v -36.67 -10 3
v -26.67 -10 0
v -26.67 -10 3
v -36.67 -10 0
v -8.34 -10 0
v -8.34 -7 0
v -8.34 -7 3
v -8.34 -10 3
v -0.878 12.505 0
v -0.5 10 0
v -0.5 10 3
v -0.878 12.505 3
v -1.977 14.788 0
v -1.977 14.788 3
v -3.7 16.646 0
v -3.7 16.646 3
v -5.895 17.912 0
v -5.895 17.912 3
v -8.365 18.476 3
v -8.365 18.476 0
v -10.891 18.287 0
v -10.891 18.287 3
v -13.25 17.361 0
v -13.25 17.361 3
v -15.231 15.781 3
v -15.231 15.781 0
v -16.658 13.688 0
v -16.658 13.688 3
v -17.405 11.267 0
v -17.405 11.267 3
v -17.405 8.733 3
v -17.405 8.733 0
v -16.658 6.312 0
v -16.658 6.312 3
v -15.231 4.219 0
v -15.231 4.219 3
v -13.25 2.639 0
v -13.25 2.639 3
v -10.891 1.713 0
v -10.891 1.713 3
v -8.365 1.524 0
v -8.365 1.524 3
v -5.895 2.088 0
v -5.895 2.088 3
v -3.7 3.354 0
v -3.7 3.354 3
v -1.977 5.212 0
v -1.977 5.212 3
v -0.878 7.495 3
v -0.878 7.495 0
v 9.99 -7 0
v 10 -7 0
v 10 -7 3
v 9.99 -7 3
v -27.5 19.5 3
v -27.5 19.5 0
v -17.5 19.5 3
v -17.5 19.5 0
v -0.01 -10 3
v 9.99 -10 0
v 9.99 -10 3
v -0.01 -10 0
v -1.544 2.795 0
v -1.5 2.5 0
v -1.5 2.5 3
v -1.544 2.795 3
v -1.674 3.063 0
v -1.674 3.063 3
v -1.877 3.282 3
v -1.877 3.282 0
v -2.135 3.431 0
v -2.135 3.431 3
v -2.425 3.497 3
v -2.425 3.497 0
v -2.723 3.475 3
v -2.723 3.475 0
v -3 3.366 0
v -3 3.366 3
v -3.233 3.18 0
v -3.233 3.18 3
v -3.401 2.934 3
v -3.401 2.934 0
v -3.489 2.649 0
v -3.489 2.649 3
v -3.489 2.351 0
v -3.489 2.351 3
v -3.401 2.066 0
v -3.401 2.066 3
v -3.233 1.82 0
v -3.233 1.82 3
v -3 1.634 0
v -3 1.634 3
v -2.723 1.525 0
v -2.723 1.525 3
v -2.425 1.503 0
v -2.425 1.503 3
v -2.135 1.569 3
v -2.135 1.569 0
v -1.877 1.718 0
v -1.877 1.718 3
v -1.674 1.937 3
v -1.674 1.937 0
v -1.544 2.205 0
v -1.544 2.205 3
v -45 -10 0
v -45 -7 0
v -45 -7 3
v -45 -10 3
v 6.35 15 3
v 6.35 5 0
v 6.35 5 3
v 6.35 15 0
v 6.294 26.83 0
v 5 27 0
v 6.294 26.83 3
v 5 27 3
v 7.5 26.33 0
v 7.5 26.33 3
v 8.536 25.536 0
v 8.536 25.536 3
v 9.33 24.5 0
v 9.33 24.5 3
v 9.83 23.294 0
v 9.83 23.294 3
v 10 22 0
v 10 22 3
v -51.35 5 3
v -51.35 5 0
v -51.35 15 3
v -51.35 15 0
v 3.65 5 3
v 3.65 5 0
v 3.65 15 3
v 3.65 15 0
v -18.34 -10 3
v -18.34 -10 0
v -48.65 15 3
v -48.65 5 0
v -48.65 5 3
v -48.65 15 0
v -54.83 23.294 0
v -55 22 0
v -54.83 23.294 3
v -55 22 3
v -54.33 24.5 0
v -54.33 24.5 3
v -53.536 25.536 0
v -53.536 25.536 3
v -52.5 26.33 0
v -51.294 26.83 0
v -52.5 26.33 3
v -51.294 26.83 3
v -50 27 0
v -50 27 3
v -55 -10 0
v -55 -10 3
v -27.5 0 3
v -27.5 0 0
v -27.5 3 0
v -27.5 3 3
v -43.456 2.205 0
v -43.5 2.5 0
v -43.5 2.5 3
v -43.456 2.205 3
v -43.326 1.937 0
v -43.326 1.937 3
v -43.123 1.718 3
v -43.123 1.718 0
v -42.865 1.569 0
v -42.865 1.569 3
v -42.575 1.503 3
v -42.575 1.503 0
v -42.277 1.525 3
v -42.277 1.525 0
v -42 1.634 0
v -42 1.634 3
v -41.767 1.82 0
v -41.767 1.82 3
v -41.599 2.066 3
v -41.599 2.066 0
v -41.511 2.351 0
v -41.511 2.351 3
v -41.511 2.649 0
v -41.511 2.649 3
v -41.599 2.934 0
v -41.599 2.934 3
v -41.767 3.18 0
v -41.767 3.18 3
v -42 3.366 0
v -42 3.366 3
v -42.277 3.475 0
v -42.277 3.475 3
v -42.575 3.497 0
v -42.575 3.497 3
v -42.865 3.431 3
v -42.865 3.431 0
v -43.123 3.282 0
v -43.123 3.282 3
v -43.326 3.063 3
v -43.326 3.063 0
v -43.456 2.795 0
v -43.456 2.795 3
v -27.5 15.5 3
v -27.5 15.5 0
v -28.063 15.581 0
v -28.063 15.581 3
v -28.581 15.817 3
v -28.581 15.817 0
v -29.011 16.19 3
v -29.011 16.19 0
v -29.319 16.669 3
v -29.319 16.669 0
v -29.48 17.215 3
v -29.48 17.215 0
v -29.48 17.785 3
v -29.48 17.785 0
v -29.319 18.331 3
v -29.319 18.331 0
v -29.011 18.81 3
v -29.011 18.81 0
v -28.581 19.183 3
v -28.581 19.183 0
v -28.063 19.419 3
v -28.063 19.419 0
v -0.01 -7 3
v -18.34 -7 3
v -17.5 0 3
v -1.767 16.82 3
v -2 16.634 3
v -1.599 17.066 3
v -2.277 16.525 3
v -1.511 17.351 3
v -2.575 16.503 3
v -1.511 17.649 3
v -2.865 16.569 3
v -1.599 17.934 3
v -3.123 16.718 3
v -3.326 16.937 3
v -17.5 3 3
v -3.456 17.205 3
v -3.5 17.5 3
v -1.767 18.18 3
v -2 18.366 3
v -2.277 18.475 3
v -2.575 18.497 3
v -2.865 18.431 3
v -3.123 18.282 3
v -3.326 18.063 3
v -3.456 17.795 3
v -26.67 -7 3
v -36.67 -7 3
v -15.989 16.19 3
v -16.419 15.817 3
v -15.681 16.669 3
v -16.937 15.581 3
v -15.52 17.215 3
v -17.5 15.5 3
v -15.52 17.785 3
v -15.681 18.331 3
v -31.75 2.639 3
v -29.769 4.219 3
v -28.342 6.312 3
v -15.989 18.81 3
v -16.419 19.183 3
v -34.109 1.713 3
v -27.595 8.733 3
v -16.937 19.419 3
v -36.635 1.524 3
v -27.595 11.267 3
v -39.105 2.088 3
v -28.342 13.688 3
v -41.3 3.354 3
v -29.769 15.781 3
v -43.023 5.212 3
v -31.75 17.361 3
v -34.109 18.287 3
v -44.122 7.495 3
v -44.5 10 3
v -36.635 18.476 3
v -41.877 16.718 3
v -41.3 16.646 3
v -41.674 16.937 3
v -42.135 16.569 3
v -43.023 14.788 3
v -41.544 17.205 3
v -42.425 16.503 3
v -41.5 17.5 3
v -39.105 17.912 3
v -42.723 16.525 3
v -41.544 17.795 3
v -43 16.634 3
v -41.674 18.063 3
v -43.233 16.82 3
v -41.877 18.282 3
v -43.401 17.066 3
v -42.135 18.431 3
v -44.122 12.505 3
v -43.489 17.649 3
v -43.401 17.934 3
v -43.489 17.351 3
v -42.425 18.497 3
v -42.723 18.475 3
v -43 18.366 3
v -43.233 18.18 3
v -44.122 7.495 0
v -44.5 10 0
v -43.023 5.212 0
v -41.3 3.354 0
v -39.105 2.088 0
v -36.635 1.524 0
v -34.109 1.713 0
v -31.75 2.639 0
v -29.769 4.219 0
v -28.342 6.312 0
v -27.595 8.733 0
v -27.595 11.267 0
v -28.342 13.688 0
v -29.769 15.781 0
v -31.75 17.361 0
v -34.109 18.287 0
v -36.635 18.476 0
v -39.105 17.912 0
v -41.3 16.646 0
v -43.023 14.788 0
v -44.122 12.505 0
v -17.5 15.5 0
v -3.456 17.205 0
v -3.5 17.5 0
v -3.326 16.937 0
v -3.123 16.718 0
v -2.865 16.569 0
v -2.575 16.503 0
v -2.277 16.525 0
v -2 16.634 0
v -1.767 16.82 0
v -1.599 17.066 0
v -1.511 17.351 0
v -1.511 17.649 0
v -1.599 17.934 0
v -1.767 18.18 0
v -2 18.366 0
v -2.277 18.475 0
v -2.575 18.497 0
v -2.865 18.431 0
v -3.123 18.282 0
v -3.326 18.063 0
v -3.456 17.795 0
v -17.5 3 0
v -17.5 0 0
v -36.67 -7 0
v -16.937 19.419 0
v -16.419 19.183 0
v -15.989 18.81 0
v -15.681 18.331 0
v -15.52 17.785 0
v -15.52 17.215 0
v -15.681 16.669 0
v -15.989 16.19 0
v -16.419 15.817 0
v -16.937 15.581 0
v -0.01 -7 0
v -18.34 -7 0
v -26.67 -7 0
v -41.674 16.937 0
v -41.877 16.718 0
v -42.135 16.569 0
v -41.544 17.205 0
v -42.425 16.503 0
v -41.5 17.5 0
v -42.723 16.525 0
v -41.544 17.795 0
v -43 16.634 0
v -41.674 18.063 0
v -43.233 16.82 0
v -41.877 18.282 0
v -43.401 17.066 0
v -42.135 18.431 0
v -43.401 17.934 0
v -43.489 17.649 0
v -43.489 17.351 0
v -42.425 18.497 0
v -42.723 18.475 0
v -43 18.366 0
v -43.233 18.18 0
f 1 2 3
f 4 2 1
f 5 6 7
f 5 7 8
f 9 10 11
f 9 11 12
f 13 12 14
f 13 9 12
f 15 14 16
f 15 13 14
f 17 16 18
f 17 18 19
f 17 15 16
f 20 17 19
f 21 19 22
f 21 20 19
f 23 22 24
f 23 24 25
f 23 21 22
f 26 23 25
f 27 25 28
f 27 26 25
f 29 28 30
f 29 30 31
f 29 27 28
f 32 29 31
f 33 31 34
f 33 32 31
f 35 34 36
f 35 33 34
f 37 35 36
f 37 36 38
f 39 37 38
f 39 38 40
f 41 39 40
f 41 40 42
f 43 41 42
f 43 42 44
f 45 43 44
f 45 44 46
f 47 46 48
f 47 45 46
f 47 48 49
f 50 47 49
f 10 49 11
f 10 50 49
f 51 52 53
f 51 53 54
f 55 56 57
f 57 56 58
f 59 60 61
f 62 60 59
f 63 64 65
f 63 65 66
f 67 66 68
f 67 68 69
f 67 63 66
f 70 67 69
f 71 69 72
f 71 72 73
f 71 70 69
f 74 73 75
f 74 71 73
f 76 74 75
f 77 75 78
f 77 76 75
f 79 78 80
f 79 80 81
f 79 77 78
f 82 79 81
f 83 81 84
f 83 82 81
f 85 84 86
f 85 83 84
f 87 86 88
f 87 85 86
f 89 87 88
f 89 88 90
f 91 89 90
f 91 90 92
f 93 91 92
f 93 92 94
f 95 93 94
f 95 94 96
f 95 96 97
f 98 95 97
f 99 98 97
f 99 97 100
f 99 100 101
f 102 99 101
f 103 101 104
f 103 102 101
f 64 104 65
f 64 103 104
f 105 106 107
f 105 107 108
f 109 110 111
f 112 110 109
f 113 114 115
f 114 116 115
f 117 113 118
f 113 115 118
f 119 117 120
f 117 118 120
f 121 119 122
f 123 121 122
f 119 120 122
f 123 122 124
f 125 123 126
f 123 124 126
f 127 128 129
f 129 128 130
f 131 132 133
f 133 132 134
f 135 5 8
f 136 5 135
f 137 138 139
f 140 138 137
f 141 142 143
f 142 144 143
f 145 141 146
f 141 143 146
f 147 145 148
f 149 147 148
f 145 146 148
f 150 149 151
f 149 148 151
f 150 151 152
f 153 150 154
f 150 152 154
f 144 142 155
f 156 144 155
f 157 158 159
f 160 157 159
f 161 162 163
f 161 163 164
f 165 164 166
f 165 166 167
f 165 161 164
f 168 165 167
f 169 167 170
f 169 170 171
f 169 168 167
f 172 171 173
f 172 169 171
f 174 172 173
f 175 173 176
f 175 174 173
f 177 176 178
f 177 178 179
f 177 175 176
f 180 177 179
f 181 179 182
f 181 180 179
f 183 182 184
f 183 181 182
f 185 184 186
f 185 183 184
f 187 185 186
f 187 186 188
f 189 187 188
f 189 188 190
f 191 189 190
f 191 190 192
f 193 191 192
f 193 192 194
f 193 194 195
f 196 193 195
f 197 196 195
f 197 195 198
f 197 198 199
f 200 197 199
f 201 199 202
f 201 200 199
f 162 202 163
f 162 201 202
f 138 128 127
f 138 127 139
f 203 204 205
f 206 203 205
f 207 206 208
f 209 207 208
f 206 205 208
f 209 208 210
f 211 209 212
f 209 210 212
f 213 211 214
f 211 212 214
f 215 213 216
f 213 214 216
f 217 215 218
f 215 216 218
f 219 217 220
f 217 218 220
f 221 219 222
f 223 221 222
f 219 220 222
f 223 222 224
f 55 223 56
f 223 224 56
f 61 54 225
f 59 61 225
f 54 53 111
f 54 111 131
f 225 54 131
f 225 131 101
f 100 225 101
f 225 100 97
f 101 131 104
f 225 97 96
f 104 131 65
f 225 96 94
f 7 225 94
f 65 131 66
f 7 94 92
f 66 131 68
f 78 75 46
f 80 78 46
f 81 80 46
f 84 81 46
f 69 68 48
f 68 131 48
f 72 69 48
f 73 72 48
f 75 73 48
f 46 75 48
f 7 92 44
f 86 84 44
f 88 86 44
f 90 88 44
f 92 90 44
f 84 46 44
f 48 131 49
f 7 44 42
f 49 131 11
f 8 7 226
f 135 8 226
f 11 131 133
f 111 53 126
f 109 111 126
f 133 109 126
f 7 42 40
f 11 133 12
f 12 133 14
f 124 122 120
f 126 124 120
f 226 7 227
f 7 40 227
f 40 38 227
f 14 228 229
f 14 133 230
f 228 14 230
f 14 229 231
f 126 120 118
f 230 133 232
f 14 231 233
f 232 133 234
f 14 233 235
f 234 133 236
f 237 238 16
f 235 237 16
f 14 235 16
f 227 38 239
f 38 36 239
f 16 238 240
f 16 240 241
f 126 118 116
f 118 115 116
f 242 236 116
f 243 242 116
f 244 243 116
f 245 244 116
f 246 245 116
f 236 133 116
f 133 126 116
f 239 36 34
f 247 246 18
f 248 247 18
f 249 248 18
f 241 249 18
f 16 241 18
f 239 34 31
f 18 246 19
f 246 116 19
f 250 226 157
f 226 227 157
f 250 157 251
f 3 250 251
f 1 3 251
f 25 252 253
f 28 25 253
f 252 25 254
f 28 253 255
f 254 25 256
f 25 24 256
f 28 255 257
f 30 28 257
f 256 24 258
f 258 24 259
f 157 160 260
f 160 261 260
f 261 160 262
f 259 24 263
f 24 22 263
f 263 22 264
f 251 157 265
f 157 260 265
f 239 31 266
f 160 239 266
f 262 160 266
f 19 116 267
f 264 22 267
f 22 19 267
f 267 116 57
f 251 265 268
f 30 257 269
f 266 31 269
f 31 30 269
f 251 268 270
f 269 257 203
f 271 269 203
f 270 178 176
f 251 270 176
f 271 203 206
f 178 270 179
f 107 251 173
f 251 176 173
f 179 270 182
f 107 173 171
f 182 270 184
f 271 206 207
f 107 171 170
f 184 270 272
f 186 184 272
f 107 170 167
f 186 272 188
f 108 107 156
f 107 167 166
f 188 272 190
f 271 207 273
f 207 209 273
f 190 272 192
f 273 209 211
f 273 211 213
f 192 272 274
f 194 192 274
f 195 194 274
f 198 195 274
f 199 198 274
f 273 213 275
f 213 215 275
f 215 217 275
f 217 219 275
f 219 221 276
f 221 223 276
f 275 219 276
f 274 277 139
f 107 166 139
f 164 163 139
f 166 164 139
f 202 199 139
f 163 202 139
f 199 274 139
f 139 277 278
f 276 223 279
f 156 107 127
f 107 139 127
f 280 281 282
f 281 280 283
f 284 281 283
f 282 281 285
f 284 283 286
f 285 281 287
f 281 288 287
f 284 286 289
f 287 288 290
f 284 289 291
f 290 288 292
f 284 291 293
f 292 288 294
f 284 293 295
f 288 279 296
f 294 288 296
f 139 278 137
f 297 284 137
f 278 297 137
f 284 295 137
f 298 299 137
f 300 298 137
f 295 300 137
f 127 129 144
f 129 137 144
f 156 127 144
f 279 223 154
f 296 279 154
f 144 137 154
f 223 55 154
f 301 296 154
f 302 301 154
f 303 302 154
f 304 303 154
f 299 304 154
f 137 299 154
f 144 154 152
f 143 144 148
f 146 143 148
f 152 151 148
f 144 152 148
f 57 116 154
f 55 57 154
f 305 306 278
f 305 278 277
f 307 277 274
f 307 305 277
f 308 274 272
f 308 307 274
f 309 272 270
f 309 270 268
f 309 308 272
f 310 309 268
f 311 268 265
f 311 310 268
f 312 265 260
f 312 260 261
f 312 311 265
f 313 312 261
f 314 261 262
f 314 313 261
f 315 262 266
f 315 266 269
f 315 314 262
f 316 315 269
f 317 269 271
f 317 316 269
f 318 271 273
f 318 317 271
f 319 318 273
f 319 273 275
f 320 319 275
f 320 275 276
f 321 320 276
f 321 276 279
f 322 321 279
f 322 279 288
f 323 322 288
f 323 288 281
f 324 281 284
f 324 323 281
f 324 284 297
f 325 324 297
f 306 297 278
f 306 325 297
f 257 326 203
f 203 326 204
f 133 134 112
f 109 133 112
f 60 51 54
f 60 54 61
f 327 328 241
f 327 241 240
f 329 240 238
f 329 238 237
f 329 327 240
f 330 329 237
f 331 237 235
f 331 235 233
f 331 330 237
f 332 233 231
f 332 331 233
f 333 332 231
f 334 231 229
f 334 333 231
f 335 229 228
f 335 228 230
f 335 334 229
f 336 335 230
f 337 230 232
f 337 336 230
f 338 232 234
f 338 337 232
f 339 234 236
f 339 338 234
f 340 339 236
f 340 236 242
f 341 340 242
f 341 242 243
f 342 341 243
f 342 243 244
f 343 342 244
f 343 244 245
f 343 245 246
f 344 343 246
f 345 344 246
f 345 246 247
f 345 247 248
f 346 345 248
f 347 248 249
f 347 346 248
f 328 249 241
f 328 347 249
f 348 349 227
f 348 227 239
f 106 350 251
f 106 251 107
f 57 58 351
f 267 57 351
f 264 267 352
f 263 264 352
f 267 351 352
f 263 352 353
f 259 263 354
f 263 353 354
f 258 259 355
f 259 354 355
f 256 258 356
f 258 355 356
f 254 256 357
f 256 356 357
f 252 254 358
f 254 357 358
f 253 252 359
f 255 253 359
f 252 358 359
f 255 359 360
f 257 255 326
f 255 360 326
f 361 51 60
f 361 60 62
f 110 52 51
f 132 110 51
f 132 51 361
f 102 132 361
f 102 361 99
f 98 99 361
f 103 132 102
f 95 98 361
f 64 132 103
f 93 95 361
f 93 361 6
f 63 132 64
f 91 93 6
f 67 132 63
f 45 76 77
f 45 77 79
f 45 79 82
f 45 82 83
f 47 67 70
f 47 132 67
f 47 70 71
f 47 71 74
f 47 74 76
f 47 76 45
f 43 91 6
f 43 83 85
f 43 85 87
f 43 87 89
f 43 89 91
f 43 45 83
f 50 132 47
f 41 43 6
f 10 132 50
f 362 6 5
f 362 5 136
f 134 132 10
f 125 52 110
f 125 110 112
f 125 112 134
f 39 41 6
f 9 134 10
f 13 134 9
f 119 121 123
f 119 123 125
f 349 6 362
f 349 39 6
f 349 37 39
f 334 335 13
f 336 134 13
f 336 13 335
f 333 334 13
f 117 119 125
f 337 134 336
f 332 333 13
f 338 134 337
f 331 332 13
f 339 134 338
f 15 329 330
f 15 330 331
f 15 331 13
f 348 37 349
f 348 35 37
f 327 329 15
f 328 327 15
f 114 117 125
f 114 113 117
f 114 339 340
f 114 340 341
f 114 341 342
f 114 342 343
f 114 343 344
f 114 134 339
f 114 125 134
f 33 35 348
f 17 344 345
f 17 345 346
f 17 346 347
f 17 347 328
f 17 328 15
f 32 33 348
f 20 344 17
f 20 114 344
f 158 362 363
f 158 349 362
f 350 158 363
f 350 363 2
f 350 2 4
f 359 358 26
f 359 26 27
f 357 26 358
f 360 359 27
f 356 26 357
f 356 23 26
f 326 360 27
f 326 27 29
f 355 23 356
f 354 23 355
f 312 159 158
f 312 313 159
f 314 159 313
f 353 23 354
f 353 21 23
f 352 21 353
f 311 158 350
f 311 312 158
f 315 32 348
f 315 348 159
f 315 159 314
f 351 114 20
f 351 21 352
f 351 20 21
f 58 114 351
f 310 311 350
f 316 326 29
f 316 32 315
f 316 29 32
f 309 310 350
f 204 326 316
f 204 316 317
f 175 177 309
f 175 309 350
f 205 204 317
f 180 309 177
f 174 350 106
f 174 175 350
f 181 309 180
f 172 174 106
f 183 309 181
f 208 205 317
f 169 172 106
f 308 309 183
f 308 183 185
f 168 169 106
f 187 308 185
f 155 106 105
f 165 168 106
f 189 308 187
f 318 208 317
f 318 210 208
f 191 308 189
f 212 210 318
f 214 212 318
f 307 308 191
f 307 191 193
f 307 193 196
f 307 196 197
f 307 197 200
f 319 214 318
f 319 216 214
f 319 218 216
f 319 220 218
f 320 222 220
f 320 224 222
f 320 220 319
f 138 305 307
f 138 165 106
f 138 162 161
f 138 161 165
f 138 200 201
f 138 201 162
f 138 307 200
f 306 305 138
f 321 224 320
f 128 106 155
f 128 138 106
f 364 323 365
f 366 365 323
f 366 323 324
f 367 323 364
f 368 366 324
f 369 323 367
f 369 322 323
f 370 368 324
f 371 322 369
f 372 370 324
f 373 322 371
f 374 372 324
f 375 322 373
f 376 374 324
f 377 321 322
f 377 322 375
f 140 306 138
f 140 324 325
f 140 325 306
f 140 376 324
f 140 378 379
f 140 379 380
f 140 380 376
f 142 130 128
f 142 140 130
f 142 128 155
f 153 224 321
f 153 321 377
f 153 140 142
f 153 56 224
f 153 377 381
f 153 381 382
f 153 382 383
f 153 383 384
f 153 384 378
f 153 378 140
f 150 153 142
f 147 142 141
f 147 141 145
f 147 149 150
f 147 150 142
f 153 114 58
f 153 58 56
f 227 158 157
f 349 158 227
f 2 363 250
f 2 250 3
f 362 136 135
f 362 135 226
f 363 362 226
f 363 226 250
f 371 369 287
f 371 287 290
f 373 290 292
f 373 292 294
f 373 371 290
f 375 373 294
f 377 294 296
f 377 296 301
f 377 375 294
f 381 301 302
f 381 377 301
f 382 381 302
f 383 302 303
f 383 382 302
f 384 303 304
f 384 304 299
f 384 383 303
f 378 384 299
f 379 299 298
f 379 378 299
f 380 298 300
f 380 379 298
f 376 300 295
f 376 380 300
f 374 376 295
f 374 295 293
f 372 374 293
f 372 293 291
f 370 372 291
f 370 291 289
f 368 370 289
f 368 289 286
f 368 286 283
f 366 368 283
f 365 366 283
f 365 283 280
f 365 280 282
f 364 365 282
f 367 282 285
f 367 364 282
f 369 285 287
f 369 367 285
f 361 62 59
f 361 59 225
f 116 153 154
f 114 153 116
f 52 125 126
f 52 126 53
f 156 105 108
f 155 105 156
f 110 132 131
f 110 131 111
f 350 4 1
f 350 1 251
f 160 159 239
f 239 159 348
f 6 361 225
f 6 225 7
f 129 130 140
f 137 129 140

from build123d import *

# Parameters (mm, degrees)
SKETCH1_R           = 1
SKETCH1_R_2         = 8.5
SKETCH1_W           = 10
SKETCH1_H           = 3
SKETCH1_W_2         = 2.7
SKETCH1_H_2         = 10
BOSS_EXTRUDE1_DEPTH = 3
FILLET1_R           = 5


with BuildPart() as part:
    # Sketch1 → Boss-Extrude1 (new body)
    with BuildSketch(Plane.XY):
        Polygon((-18.34, -7), (-26.67, -7), (-26.67, -10), (-36.67, -10), (-36.67, -7), (-45, -7), (-45, -10), (-55, -10), (-55, -7), (-55, 27), (10, 27), (10, -7), (9.99, -7), (9.99, -10), (-0.01, -10), (-0.01, -7), (-8.34, -7), (-8.34, -10), (-18.34, -10), align=None)
        with Locations((-42.5, 17.5)):
            Circle(SKETCH1_R, mode=Mode.SUBTRACT)
        with Locations((-9, 10)):
            Circle(SKETCH1_R_2, mode=Mode.SUBTRACT)
        with Locations(Location((-36, 10, 0), (0, 0, 180))):
            Circle(SKETCH1_R_2, mode=Mode.SUBTRACT)
        with Locations(Location((-2.5, 17.5, 0), (0, 0, 180))):
            Circle(SKETCH1_R, mode=Mode.SUBTRACT)
        with Locations((-2.5, 2.5)):
            Circle(SKETCH1_R, mode=Mode.SUBTRACT)
        with Locations(Location((-42.5, 2.5, 0), (0, 0, 180))):
            Circle(SKETCH1_R, mode=Mode.SUBTRACT)
        with BuildLine():
            Line((-27.5, 19.5), (-17.5, 19.5))
            ThreePointArc((-17.5, 19.5), (-15.5, 17.5), (-17.5, 15.5))
            Line((-17.5, 15.5), (-27.5, 15.5))
            ThreePointArc((-27.5, 15.5), (-29.5, 17.5), (-27.5, 19.5))
        make_face(mode=Mode.SUBTRACT)
        with Locations((-22.5, 1.5)):
            Rectangle(SKETCH1_W, SKETCH1_H, mode=Mode.SUBTRACT)
        with Locations((-50, 10)):
            Rectangle(SKETCH1_W_2, SKETCH1_H_2, mode=Mode.SUBTRACT)
        with Locations((5, 10)):
            Rectangle(SKETCH1_W_2, SKETCH1_H_2, mode=Mode.SUBTRACT)
    extrude(amount=BOSS_EXTRUDE1_DEPTH)

    # Fillet1
    fillet1_edges = [part.edges().sort_by_distance(p)[0] for p in [
        (-55, 27, 1.5),
        (10, 27, 1.5),
    ]]
    fillet(fillet1_edges, radius=FILLET1_R)


solid = part.part
